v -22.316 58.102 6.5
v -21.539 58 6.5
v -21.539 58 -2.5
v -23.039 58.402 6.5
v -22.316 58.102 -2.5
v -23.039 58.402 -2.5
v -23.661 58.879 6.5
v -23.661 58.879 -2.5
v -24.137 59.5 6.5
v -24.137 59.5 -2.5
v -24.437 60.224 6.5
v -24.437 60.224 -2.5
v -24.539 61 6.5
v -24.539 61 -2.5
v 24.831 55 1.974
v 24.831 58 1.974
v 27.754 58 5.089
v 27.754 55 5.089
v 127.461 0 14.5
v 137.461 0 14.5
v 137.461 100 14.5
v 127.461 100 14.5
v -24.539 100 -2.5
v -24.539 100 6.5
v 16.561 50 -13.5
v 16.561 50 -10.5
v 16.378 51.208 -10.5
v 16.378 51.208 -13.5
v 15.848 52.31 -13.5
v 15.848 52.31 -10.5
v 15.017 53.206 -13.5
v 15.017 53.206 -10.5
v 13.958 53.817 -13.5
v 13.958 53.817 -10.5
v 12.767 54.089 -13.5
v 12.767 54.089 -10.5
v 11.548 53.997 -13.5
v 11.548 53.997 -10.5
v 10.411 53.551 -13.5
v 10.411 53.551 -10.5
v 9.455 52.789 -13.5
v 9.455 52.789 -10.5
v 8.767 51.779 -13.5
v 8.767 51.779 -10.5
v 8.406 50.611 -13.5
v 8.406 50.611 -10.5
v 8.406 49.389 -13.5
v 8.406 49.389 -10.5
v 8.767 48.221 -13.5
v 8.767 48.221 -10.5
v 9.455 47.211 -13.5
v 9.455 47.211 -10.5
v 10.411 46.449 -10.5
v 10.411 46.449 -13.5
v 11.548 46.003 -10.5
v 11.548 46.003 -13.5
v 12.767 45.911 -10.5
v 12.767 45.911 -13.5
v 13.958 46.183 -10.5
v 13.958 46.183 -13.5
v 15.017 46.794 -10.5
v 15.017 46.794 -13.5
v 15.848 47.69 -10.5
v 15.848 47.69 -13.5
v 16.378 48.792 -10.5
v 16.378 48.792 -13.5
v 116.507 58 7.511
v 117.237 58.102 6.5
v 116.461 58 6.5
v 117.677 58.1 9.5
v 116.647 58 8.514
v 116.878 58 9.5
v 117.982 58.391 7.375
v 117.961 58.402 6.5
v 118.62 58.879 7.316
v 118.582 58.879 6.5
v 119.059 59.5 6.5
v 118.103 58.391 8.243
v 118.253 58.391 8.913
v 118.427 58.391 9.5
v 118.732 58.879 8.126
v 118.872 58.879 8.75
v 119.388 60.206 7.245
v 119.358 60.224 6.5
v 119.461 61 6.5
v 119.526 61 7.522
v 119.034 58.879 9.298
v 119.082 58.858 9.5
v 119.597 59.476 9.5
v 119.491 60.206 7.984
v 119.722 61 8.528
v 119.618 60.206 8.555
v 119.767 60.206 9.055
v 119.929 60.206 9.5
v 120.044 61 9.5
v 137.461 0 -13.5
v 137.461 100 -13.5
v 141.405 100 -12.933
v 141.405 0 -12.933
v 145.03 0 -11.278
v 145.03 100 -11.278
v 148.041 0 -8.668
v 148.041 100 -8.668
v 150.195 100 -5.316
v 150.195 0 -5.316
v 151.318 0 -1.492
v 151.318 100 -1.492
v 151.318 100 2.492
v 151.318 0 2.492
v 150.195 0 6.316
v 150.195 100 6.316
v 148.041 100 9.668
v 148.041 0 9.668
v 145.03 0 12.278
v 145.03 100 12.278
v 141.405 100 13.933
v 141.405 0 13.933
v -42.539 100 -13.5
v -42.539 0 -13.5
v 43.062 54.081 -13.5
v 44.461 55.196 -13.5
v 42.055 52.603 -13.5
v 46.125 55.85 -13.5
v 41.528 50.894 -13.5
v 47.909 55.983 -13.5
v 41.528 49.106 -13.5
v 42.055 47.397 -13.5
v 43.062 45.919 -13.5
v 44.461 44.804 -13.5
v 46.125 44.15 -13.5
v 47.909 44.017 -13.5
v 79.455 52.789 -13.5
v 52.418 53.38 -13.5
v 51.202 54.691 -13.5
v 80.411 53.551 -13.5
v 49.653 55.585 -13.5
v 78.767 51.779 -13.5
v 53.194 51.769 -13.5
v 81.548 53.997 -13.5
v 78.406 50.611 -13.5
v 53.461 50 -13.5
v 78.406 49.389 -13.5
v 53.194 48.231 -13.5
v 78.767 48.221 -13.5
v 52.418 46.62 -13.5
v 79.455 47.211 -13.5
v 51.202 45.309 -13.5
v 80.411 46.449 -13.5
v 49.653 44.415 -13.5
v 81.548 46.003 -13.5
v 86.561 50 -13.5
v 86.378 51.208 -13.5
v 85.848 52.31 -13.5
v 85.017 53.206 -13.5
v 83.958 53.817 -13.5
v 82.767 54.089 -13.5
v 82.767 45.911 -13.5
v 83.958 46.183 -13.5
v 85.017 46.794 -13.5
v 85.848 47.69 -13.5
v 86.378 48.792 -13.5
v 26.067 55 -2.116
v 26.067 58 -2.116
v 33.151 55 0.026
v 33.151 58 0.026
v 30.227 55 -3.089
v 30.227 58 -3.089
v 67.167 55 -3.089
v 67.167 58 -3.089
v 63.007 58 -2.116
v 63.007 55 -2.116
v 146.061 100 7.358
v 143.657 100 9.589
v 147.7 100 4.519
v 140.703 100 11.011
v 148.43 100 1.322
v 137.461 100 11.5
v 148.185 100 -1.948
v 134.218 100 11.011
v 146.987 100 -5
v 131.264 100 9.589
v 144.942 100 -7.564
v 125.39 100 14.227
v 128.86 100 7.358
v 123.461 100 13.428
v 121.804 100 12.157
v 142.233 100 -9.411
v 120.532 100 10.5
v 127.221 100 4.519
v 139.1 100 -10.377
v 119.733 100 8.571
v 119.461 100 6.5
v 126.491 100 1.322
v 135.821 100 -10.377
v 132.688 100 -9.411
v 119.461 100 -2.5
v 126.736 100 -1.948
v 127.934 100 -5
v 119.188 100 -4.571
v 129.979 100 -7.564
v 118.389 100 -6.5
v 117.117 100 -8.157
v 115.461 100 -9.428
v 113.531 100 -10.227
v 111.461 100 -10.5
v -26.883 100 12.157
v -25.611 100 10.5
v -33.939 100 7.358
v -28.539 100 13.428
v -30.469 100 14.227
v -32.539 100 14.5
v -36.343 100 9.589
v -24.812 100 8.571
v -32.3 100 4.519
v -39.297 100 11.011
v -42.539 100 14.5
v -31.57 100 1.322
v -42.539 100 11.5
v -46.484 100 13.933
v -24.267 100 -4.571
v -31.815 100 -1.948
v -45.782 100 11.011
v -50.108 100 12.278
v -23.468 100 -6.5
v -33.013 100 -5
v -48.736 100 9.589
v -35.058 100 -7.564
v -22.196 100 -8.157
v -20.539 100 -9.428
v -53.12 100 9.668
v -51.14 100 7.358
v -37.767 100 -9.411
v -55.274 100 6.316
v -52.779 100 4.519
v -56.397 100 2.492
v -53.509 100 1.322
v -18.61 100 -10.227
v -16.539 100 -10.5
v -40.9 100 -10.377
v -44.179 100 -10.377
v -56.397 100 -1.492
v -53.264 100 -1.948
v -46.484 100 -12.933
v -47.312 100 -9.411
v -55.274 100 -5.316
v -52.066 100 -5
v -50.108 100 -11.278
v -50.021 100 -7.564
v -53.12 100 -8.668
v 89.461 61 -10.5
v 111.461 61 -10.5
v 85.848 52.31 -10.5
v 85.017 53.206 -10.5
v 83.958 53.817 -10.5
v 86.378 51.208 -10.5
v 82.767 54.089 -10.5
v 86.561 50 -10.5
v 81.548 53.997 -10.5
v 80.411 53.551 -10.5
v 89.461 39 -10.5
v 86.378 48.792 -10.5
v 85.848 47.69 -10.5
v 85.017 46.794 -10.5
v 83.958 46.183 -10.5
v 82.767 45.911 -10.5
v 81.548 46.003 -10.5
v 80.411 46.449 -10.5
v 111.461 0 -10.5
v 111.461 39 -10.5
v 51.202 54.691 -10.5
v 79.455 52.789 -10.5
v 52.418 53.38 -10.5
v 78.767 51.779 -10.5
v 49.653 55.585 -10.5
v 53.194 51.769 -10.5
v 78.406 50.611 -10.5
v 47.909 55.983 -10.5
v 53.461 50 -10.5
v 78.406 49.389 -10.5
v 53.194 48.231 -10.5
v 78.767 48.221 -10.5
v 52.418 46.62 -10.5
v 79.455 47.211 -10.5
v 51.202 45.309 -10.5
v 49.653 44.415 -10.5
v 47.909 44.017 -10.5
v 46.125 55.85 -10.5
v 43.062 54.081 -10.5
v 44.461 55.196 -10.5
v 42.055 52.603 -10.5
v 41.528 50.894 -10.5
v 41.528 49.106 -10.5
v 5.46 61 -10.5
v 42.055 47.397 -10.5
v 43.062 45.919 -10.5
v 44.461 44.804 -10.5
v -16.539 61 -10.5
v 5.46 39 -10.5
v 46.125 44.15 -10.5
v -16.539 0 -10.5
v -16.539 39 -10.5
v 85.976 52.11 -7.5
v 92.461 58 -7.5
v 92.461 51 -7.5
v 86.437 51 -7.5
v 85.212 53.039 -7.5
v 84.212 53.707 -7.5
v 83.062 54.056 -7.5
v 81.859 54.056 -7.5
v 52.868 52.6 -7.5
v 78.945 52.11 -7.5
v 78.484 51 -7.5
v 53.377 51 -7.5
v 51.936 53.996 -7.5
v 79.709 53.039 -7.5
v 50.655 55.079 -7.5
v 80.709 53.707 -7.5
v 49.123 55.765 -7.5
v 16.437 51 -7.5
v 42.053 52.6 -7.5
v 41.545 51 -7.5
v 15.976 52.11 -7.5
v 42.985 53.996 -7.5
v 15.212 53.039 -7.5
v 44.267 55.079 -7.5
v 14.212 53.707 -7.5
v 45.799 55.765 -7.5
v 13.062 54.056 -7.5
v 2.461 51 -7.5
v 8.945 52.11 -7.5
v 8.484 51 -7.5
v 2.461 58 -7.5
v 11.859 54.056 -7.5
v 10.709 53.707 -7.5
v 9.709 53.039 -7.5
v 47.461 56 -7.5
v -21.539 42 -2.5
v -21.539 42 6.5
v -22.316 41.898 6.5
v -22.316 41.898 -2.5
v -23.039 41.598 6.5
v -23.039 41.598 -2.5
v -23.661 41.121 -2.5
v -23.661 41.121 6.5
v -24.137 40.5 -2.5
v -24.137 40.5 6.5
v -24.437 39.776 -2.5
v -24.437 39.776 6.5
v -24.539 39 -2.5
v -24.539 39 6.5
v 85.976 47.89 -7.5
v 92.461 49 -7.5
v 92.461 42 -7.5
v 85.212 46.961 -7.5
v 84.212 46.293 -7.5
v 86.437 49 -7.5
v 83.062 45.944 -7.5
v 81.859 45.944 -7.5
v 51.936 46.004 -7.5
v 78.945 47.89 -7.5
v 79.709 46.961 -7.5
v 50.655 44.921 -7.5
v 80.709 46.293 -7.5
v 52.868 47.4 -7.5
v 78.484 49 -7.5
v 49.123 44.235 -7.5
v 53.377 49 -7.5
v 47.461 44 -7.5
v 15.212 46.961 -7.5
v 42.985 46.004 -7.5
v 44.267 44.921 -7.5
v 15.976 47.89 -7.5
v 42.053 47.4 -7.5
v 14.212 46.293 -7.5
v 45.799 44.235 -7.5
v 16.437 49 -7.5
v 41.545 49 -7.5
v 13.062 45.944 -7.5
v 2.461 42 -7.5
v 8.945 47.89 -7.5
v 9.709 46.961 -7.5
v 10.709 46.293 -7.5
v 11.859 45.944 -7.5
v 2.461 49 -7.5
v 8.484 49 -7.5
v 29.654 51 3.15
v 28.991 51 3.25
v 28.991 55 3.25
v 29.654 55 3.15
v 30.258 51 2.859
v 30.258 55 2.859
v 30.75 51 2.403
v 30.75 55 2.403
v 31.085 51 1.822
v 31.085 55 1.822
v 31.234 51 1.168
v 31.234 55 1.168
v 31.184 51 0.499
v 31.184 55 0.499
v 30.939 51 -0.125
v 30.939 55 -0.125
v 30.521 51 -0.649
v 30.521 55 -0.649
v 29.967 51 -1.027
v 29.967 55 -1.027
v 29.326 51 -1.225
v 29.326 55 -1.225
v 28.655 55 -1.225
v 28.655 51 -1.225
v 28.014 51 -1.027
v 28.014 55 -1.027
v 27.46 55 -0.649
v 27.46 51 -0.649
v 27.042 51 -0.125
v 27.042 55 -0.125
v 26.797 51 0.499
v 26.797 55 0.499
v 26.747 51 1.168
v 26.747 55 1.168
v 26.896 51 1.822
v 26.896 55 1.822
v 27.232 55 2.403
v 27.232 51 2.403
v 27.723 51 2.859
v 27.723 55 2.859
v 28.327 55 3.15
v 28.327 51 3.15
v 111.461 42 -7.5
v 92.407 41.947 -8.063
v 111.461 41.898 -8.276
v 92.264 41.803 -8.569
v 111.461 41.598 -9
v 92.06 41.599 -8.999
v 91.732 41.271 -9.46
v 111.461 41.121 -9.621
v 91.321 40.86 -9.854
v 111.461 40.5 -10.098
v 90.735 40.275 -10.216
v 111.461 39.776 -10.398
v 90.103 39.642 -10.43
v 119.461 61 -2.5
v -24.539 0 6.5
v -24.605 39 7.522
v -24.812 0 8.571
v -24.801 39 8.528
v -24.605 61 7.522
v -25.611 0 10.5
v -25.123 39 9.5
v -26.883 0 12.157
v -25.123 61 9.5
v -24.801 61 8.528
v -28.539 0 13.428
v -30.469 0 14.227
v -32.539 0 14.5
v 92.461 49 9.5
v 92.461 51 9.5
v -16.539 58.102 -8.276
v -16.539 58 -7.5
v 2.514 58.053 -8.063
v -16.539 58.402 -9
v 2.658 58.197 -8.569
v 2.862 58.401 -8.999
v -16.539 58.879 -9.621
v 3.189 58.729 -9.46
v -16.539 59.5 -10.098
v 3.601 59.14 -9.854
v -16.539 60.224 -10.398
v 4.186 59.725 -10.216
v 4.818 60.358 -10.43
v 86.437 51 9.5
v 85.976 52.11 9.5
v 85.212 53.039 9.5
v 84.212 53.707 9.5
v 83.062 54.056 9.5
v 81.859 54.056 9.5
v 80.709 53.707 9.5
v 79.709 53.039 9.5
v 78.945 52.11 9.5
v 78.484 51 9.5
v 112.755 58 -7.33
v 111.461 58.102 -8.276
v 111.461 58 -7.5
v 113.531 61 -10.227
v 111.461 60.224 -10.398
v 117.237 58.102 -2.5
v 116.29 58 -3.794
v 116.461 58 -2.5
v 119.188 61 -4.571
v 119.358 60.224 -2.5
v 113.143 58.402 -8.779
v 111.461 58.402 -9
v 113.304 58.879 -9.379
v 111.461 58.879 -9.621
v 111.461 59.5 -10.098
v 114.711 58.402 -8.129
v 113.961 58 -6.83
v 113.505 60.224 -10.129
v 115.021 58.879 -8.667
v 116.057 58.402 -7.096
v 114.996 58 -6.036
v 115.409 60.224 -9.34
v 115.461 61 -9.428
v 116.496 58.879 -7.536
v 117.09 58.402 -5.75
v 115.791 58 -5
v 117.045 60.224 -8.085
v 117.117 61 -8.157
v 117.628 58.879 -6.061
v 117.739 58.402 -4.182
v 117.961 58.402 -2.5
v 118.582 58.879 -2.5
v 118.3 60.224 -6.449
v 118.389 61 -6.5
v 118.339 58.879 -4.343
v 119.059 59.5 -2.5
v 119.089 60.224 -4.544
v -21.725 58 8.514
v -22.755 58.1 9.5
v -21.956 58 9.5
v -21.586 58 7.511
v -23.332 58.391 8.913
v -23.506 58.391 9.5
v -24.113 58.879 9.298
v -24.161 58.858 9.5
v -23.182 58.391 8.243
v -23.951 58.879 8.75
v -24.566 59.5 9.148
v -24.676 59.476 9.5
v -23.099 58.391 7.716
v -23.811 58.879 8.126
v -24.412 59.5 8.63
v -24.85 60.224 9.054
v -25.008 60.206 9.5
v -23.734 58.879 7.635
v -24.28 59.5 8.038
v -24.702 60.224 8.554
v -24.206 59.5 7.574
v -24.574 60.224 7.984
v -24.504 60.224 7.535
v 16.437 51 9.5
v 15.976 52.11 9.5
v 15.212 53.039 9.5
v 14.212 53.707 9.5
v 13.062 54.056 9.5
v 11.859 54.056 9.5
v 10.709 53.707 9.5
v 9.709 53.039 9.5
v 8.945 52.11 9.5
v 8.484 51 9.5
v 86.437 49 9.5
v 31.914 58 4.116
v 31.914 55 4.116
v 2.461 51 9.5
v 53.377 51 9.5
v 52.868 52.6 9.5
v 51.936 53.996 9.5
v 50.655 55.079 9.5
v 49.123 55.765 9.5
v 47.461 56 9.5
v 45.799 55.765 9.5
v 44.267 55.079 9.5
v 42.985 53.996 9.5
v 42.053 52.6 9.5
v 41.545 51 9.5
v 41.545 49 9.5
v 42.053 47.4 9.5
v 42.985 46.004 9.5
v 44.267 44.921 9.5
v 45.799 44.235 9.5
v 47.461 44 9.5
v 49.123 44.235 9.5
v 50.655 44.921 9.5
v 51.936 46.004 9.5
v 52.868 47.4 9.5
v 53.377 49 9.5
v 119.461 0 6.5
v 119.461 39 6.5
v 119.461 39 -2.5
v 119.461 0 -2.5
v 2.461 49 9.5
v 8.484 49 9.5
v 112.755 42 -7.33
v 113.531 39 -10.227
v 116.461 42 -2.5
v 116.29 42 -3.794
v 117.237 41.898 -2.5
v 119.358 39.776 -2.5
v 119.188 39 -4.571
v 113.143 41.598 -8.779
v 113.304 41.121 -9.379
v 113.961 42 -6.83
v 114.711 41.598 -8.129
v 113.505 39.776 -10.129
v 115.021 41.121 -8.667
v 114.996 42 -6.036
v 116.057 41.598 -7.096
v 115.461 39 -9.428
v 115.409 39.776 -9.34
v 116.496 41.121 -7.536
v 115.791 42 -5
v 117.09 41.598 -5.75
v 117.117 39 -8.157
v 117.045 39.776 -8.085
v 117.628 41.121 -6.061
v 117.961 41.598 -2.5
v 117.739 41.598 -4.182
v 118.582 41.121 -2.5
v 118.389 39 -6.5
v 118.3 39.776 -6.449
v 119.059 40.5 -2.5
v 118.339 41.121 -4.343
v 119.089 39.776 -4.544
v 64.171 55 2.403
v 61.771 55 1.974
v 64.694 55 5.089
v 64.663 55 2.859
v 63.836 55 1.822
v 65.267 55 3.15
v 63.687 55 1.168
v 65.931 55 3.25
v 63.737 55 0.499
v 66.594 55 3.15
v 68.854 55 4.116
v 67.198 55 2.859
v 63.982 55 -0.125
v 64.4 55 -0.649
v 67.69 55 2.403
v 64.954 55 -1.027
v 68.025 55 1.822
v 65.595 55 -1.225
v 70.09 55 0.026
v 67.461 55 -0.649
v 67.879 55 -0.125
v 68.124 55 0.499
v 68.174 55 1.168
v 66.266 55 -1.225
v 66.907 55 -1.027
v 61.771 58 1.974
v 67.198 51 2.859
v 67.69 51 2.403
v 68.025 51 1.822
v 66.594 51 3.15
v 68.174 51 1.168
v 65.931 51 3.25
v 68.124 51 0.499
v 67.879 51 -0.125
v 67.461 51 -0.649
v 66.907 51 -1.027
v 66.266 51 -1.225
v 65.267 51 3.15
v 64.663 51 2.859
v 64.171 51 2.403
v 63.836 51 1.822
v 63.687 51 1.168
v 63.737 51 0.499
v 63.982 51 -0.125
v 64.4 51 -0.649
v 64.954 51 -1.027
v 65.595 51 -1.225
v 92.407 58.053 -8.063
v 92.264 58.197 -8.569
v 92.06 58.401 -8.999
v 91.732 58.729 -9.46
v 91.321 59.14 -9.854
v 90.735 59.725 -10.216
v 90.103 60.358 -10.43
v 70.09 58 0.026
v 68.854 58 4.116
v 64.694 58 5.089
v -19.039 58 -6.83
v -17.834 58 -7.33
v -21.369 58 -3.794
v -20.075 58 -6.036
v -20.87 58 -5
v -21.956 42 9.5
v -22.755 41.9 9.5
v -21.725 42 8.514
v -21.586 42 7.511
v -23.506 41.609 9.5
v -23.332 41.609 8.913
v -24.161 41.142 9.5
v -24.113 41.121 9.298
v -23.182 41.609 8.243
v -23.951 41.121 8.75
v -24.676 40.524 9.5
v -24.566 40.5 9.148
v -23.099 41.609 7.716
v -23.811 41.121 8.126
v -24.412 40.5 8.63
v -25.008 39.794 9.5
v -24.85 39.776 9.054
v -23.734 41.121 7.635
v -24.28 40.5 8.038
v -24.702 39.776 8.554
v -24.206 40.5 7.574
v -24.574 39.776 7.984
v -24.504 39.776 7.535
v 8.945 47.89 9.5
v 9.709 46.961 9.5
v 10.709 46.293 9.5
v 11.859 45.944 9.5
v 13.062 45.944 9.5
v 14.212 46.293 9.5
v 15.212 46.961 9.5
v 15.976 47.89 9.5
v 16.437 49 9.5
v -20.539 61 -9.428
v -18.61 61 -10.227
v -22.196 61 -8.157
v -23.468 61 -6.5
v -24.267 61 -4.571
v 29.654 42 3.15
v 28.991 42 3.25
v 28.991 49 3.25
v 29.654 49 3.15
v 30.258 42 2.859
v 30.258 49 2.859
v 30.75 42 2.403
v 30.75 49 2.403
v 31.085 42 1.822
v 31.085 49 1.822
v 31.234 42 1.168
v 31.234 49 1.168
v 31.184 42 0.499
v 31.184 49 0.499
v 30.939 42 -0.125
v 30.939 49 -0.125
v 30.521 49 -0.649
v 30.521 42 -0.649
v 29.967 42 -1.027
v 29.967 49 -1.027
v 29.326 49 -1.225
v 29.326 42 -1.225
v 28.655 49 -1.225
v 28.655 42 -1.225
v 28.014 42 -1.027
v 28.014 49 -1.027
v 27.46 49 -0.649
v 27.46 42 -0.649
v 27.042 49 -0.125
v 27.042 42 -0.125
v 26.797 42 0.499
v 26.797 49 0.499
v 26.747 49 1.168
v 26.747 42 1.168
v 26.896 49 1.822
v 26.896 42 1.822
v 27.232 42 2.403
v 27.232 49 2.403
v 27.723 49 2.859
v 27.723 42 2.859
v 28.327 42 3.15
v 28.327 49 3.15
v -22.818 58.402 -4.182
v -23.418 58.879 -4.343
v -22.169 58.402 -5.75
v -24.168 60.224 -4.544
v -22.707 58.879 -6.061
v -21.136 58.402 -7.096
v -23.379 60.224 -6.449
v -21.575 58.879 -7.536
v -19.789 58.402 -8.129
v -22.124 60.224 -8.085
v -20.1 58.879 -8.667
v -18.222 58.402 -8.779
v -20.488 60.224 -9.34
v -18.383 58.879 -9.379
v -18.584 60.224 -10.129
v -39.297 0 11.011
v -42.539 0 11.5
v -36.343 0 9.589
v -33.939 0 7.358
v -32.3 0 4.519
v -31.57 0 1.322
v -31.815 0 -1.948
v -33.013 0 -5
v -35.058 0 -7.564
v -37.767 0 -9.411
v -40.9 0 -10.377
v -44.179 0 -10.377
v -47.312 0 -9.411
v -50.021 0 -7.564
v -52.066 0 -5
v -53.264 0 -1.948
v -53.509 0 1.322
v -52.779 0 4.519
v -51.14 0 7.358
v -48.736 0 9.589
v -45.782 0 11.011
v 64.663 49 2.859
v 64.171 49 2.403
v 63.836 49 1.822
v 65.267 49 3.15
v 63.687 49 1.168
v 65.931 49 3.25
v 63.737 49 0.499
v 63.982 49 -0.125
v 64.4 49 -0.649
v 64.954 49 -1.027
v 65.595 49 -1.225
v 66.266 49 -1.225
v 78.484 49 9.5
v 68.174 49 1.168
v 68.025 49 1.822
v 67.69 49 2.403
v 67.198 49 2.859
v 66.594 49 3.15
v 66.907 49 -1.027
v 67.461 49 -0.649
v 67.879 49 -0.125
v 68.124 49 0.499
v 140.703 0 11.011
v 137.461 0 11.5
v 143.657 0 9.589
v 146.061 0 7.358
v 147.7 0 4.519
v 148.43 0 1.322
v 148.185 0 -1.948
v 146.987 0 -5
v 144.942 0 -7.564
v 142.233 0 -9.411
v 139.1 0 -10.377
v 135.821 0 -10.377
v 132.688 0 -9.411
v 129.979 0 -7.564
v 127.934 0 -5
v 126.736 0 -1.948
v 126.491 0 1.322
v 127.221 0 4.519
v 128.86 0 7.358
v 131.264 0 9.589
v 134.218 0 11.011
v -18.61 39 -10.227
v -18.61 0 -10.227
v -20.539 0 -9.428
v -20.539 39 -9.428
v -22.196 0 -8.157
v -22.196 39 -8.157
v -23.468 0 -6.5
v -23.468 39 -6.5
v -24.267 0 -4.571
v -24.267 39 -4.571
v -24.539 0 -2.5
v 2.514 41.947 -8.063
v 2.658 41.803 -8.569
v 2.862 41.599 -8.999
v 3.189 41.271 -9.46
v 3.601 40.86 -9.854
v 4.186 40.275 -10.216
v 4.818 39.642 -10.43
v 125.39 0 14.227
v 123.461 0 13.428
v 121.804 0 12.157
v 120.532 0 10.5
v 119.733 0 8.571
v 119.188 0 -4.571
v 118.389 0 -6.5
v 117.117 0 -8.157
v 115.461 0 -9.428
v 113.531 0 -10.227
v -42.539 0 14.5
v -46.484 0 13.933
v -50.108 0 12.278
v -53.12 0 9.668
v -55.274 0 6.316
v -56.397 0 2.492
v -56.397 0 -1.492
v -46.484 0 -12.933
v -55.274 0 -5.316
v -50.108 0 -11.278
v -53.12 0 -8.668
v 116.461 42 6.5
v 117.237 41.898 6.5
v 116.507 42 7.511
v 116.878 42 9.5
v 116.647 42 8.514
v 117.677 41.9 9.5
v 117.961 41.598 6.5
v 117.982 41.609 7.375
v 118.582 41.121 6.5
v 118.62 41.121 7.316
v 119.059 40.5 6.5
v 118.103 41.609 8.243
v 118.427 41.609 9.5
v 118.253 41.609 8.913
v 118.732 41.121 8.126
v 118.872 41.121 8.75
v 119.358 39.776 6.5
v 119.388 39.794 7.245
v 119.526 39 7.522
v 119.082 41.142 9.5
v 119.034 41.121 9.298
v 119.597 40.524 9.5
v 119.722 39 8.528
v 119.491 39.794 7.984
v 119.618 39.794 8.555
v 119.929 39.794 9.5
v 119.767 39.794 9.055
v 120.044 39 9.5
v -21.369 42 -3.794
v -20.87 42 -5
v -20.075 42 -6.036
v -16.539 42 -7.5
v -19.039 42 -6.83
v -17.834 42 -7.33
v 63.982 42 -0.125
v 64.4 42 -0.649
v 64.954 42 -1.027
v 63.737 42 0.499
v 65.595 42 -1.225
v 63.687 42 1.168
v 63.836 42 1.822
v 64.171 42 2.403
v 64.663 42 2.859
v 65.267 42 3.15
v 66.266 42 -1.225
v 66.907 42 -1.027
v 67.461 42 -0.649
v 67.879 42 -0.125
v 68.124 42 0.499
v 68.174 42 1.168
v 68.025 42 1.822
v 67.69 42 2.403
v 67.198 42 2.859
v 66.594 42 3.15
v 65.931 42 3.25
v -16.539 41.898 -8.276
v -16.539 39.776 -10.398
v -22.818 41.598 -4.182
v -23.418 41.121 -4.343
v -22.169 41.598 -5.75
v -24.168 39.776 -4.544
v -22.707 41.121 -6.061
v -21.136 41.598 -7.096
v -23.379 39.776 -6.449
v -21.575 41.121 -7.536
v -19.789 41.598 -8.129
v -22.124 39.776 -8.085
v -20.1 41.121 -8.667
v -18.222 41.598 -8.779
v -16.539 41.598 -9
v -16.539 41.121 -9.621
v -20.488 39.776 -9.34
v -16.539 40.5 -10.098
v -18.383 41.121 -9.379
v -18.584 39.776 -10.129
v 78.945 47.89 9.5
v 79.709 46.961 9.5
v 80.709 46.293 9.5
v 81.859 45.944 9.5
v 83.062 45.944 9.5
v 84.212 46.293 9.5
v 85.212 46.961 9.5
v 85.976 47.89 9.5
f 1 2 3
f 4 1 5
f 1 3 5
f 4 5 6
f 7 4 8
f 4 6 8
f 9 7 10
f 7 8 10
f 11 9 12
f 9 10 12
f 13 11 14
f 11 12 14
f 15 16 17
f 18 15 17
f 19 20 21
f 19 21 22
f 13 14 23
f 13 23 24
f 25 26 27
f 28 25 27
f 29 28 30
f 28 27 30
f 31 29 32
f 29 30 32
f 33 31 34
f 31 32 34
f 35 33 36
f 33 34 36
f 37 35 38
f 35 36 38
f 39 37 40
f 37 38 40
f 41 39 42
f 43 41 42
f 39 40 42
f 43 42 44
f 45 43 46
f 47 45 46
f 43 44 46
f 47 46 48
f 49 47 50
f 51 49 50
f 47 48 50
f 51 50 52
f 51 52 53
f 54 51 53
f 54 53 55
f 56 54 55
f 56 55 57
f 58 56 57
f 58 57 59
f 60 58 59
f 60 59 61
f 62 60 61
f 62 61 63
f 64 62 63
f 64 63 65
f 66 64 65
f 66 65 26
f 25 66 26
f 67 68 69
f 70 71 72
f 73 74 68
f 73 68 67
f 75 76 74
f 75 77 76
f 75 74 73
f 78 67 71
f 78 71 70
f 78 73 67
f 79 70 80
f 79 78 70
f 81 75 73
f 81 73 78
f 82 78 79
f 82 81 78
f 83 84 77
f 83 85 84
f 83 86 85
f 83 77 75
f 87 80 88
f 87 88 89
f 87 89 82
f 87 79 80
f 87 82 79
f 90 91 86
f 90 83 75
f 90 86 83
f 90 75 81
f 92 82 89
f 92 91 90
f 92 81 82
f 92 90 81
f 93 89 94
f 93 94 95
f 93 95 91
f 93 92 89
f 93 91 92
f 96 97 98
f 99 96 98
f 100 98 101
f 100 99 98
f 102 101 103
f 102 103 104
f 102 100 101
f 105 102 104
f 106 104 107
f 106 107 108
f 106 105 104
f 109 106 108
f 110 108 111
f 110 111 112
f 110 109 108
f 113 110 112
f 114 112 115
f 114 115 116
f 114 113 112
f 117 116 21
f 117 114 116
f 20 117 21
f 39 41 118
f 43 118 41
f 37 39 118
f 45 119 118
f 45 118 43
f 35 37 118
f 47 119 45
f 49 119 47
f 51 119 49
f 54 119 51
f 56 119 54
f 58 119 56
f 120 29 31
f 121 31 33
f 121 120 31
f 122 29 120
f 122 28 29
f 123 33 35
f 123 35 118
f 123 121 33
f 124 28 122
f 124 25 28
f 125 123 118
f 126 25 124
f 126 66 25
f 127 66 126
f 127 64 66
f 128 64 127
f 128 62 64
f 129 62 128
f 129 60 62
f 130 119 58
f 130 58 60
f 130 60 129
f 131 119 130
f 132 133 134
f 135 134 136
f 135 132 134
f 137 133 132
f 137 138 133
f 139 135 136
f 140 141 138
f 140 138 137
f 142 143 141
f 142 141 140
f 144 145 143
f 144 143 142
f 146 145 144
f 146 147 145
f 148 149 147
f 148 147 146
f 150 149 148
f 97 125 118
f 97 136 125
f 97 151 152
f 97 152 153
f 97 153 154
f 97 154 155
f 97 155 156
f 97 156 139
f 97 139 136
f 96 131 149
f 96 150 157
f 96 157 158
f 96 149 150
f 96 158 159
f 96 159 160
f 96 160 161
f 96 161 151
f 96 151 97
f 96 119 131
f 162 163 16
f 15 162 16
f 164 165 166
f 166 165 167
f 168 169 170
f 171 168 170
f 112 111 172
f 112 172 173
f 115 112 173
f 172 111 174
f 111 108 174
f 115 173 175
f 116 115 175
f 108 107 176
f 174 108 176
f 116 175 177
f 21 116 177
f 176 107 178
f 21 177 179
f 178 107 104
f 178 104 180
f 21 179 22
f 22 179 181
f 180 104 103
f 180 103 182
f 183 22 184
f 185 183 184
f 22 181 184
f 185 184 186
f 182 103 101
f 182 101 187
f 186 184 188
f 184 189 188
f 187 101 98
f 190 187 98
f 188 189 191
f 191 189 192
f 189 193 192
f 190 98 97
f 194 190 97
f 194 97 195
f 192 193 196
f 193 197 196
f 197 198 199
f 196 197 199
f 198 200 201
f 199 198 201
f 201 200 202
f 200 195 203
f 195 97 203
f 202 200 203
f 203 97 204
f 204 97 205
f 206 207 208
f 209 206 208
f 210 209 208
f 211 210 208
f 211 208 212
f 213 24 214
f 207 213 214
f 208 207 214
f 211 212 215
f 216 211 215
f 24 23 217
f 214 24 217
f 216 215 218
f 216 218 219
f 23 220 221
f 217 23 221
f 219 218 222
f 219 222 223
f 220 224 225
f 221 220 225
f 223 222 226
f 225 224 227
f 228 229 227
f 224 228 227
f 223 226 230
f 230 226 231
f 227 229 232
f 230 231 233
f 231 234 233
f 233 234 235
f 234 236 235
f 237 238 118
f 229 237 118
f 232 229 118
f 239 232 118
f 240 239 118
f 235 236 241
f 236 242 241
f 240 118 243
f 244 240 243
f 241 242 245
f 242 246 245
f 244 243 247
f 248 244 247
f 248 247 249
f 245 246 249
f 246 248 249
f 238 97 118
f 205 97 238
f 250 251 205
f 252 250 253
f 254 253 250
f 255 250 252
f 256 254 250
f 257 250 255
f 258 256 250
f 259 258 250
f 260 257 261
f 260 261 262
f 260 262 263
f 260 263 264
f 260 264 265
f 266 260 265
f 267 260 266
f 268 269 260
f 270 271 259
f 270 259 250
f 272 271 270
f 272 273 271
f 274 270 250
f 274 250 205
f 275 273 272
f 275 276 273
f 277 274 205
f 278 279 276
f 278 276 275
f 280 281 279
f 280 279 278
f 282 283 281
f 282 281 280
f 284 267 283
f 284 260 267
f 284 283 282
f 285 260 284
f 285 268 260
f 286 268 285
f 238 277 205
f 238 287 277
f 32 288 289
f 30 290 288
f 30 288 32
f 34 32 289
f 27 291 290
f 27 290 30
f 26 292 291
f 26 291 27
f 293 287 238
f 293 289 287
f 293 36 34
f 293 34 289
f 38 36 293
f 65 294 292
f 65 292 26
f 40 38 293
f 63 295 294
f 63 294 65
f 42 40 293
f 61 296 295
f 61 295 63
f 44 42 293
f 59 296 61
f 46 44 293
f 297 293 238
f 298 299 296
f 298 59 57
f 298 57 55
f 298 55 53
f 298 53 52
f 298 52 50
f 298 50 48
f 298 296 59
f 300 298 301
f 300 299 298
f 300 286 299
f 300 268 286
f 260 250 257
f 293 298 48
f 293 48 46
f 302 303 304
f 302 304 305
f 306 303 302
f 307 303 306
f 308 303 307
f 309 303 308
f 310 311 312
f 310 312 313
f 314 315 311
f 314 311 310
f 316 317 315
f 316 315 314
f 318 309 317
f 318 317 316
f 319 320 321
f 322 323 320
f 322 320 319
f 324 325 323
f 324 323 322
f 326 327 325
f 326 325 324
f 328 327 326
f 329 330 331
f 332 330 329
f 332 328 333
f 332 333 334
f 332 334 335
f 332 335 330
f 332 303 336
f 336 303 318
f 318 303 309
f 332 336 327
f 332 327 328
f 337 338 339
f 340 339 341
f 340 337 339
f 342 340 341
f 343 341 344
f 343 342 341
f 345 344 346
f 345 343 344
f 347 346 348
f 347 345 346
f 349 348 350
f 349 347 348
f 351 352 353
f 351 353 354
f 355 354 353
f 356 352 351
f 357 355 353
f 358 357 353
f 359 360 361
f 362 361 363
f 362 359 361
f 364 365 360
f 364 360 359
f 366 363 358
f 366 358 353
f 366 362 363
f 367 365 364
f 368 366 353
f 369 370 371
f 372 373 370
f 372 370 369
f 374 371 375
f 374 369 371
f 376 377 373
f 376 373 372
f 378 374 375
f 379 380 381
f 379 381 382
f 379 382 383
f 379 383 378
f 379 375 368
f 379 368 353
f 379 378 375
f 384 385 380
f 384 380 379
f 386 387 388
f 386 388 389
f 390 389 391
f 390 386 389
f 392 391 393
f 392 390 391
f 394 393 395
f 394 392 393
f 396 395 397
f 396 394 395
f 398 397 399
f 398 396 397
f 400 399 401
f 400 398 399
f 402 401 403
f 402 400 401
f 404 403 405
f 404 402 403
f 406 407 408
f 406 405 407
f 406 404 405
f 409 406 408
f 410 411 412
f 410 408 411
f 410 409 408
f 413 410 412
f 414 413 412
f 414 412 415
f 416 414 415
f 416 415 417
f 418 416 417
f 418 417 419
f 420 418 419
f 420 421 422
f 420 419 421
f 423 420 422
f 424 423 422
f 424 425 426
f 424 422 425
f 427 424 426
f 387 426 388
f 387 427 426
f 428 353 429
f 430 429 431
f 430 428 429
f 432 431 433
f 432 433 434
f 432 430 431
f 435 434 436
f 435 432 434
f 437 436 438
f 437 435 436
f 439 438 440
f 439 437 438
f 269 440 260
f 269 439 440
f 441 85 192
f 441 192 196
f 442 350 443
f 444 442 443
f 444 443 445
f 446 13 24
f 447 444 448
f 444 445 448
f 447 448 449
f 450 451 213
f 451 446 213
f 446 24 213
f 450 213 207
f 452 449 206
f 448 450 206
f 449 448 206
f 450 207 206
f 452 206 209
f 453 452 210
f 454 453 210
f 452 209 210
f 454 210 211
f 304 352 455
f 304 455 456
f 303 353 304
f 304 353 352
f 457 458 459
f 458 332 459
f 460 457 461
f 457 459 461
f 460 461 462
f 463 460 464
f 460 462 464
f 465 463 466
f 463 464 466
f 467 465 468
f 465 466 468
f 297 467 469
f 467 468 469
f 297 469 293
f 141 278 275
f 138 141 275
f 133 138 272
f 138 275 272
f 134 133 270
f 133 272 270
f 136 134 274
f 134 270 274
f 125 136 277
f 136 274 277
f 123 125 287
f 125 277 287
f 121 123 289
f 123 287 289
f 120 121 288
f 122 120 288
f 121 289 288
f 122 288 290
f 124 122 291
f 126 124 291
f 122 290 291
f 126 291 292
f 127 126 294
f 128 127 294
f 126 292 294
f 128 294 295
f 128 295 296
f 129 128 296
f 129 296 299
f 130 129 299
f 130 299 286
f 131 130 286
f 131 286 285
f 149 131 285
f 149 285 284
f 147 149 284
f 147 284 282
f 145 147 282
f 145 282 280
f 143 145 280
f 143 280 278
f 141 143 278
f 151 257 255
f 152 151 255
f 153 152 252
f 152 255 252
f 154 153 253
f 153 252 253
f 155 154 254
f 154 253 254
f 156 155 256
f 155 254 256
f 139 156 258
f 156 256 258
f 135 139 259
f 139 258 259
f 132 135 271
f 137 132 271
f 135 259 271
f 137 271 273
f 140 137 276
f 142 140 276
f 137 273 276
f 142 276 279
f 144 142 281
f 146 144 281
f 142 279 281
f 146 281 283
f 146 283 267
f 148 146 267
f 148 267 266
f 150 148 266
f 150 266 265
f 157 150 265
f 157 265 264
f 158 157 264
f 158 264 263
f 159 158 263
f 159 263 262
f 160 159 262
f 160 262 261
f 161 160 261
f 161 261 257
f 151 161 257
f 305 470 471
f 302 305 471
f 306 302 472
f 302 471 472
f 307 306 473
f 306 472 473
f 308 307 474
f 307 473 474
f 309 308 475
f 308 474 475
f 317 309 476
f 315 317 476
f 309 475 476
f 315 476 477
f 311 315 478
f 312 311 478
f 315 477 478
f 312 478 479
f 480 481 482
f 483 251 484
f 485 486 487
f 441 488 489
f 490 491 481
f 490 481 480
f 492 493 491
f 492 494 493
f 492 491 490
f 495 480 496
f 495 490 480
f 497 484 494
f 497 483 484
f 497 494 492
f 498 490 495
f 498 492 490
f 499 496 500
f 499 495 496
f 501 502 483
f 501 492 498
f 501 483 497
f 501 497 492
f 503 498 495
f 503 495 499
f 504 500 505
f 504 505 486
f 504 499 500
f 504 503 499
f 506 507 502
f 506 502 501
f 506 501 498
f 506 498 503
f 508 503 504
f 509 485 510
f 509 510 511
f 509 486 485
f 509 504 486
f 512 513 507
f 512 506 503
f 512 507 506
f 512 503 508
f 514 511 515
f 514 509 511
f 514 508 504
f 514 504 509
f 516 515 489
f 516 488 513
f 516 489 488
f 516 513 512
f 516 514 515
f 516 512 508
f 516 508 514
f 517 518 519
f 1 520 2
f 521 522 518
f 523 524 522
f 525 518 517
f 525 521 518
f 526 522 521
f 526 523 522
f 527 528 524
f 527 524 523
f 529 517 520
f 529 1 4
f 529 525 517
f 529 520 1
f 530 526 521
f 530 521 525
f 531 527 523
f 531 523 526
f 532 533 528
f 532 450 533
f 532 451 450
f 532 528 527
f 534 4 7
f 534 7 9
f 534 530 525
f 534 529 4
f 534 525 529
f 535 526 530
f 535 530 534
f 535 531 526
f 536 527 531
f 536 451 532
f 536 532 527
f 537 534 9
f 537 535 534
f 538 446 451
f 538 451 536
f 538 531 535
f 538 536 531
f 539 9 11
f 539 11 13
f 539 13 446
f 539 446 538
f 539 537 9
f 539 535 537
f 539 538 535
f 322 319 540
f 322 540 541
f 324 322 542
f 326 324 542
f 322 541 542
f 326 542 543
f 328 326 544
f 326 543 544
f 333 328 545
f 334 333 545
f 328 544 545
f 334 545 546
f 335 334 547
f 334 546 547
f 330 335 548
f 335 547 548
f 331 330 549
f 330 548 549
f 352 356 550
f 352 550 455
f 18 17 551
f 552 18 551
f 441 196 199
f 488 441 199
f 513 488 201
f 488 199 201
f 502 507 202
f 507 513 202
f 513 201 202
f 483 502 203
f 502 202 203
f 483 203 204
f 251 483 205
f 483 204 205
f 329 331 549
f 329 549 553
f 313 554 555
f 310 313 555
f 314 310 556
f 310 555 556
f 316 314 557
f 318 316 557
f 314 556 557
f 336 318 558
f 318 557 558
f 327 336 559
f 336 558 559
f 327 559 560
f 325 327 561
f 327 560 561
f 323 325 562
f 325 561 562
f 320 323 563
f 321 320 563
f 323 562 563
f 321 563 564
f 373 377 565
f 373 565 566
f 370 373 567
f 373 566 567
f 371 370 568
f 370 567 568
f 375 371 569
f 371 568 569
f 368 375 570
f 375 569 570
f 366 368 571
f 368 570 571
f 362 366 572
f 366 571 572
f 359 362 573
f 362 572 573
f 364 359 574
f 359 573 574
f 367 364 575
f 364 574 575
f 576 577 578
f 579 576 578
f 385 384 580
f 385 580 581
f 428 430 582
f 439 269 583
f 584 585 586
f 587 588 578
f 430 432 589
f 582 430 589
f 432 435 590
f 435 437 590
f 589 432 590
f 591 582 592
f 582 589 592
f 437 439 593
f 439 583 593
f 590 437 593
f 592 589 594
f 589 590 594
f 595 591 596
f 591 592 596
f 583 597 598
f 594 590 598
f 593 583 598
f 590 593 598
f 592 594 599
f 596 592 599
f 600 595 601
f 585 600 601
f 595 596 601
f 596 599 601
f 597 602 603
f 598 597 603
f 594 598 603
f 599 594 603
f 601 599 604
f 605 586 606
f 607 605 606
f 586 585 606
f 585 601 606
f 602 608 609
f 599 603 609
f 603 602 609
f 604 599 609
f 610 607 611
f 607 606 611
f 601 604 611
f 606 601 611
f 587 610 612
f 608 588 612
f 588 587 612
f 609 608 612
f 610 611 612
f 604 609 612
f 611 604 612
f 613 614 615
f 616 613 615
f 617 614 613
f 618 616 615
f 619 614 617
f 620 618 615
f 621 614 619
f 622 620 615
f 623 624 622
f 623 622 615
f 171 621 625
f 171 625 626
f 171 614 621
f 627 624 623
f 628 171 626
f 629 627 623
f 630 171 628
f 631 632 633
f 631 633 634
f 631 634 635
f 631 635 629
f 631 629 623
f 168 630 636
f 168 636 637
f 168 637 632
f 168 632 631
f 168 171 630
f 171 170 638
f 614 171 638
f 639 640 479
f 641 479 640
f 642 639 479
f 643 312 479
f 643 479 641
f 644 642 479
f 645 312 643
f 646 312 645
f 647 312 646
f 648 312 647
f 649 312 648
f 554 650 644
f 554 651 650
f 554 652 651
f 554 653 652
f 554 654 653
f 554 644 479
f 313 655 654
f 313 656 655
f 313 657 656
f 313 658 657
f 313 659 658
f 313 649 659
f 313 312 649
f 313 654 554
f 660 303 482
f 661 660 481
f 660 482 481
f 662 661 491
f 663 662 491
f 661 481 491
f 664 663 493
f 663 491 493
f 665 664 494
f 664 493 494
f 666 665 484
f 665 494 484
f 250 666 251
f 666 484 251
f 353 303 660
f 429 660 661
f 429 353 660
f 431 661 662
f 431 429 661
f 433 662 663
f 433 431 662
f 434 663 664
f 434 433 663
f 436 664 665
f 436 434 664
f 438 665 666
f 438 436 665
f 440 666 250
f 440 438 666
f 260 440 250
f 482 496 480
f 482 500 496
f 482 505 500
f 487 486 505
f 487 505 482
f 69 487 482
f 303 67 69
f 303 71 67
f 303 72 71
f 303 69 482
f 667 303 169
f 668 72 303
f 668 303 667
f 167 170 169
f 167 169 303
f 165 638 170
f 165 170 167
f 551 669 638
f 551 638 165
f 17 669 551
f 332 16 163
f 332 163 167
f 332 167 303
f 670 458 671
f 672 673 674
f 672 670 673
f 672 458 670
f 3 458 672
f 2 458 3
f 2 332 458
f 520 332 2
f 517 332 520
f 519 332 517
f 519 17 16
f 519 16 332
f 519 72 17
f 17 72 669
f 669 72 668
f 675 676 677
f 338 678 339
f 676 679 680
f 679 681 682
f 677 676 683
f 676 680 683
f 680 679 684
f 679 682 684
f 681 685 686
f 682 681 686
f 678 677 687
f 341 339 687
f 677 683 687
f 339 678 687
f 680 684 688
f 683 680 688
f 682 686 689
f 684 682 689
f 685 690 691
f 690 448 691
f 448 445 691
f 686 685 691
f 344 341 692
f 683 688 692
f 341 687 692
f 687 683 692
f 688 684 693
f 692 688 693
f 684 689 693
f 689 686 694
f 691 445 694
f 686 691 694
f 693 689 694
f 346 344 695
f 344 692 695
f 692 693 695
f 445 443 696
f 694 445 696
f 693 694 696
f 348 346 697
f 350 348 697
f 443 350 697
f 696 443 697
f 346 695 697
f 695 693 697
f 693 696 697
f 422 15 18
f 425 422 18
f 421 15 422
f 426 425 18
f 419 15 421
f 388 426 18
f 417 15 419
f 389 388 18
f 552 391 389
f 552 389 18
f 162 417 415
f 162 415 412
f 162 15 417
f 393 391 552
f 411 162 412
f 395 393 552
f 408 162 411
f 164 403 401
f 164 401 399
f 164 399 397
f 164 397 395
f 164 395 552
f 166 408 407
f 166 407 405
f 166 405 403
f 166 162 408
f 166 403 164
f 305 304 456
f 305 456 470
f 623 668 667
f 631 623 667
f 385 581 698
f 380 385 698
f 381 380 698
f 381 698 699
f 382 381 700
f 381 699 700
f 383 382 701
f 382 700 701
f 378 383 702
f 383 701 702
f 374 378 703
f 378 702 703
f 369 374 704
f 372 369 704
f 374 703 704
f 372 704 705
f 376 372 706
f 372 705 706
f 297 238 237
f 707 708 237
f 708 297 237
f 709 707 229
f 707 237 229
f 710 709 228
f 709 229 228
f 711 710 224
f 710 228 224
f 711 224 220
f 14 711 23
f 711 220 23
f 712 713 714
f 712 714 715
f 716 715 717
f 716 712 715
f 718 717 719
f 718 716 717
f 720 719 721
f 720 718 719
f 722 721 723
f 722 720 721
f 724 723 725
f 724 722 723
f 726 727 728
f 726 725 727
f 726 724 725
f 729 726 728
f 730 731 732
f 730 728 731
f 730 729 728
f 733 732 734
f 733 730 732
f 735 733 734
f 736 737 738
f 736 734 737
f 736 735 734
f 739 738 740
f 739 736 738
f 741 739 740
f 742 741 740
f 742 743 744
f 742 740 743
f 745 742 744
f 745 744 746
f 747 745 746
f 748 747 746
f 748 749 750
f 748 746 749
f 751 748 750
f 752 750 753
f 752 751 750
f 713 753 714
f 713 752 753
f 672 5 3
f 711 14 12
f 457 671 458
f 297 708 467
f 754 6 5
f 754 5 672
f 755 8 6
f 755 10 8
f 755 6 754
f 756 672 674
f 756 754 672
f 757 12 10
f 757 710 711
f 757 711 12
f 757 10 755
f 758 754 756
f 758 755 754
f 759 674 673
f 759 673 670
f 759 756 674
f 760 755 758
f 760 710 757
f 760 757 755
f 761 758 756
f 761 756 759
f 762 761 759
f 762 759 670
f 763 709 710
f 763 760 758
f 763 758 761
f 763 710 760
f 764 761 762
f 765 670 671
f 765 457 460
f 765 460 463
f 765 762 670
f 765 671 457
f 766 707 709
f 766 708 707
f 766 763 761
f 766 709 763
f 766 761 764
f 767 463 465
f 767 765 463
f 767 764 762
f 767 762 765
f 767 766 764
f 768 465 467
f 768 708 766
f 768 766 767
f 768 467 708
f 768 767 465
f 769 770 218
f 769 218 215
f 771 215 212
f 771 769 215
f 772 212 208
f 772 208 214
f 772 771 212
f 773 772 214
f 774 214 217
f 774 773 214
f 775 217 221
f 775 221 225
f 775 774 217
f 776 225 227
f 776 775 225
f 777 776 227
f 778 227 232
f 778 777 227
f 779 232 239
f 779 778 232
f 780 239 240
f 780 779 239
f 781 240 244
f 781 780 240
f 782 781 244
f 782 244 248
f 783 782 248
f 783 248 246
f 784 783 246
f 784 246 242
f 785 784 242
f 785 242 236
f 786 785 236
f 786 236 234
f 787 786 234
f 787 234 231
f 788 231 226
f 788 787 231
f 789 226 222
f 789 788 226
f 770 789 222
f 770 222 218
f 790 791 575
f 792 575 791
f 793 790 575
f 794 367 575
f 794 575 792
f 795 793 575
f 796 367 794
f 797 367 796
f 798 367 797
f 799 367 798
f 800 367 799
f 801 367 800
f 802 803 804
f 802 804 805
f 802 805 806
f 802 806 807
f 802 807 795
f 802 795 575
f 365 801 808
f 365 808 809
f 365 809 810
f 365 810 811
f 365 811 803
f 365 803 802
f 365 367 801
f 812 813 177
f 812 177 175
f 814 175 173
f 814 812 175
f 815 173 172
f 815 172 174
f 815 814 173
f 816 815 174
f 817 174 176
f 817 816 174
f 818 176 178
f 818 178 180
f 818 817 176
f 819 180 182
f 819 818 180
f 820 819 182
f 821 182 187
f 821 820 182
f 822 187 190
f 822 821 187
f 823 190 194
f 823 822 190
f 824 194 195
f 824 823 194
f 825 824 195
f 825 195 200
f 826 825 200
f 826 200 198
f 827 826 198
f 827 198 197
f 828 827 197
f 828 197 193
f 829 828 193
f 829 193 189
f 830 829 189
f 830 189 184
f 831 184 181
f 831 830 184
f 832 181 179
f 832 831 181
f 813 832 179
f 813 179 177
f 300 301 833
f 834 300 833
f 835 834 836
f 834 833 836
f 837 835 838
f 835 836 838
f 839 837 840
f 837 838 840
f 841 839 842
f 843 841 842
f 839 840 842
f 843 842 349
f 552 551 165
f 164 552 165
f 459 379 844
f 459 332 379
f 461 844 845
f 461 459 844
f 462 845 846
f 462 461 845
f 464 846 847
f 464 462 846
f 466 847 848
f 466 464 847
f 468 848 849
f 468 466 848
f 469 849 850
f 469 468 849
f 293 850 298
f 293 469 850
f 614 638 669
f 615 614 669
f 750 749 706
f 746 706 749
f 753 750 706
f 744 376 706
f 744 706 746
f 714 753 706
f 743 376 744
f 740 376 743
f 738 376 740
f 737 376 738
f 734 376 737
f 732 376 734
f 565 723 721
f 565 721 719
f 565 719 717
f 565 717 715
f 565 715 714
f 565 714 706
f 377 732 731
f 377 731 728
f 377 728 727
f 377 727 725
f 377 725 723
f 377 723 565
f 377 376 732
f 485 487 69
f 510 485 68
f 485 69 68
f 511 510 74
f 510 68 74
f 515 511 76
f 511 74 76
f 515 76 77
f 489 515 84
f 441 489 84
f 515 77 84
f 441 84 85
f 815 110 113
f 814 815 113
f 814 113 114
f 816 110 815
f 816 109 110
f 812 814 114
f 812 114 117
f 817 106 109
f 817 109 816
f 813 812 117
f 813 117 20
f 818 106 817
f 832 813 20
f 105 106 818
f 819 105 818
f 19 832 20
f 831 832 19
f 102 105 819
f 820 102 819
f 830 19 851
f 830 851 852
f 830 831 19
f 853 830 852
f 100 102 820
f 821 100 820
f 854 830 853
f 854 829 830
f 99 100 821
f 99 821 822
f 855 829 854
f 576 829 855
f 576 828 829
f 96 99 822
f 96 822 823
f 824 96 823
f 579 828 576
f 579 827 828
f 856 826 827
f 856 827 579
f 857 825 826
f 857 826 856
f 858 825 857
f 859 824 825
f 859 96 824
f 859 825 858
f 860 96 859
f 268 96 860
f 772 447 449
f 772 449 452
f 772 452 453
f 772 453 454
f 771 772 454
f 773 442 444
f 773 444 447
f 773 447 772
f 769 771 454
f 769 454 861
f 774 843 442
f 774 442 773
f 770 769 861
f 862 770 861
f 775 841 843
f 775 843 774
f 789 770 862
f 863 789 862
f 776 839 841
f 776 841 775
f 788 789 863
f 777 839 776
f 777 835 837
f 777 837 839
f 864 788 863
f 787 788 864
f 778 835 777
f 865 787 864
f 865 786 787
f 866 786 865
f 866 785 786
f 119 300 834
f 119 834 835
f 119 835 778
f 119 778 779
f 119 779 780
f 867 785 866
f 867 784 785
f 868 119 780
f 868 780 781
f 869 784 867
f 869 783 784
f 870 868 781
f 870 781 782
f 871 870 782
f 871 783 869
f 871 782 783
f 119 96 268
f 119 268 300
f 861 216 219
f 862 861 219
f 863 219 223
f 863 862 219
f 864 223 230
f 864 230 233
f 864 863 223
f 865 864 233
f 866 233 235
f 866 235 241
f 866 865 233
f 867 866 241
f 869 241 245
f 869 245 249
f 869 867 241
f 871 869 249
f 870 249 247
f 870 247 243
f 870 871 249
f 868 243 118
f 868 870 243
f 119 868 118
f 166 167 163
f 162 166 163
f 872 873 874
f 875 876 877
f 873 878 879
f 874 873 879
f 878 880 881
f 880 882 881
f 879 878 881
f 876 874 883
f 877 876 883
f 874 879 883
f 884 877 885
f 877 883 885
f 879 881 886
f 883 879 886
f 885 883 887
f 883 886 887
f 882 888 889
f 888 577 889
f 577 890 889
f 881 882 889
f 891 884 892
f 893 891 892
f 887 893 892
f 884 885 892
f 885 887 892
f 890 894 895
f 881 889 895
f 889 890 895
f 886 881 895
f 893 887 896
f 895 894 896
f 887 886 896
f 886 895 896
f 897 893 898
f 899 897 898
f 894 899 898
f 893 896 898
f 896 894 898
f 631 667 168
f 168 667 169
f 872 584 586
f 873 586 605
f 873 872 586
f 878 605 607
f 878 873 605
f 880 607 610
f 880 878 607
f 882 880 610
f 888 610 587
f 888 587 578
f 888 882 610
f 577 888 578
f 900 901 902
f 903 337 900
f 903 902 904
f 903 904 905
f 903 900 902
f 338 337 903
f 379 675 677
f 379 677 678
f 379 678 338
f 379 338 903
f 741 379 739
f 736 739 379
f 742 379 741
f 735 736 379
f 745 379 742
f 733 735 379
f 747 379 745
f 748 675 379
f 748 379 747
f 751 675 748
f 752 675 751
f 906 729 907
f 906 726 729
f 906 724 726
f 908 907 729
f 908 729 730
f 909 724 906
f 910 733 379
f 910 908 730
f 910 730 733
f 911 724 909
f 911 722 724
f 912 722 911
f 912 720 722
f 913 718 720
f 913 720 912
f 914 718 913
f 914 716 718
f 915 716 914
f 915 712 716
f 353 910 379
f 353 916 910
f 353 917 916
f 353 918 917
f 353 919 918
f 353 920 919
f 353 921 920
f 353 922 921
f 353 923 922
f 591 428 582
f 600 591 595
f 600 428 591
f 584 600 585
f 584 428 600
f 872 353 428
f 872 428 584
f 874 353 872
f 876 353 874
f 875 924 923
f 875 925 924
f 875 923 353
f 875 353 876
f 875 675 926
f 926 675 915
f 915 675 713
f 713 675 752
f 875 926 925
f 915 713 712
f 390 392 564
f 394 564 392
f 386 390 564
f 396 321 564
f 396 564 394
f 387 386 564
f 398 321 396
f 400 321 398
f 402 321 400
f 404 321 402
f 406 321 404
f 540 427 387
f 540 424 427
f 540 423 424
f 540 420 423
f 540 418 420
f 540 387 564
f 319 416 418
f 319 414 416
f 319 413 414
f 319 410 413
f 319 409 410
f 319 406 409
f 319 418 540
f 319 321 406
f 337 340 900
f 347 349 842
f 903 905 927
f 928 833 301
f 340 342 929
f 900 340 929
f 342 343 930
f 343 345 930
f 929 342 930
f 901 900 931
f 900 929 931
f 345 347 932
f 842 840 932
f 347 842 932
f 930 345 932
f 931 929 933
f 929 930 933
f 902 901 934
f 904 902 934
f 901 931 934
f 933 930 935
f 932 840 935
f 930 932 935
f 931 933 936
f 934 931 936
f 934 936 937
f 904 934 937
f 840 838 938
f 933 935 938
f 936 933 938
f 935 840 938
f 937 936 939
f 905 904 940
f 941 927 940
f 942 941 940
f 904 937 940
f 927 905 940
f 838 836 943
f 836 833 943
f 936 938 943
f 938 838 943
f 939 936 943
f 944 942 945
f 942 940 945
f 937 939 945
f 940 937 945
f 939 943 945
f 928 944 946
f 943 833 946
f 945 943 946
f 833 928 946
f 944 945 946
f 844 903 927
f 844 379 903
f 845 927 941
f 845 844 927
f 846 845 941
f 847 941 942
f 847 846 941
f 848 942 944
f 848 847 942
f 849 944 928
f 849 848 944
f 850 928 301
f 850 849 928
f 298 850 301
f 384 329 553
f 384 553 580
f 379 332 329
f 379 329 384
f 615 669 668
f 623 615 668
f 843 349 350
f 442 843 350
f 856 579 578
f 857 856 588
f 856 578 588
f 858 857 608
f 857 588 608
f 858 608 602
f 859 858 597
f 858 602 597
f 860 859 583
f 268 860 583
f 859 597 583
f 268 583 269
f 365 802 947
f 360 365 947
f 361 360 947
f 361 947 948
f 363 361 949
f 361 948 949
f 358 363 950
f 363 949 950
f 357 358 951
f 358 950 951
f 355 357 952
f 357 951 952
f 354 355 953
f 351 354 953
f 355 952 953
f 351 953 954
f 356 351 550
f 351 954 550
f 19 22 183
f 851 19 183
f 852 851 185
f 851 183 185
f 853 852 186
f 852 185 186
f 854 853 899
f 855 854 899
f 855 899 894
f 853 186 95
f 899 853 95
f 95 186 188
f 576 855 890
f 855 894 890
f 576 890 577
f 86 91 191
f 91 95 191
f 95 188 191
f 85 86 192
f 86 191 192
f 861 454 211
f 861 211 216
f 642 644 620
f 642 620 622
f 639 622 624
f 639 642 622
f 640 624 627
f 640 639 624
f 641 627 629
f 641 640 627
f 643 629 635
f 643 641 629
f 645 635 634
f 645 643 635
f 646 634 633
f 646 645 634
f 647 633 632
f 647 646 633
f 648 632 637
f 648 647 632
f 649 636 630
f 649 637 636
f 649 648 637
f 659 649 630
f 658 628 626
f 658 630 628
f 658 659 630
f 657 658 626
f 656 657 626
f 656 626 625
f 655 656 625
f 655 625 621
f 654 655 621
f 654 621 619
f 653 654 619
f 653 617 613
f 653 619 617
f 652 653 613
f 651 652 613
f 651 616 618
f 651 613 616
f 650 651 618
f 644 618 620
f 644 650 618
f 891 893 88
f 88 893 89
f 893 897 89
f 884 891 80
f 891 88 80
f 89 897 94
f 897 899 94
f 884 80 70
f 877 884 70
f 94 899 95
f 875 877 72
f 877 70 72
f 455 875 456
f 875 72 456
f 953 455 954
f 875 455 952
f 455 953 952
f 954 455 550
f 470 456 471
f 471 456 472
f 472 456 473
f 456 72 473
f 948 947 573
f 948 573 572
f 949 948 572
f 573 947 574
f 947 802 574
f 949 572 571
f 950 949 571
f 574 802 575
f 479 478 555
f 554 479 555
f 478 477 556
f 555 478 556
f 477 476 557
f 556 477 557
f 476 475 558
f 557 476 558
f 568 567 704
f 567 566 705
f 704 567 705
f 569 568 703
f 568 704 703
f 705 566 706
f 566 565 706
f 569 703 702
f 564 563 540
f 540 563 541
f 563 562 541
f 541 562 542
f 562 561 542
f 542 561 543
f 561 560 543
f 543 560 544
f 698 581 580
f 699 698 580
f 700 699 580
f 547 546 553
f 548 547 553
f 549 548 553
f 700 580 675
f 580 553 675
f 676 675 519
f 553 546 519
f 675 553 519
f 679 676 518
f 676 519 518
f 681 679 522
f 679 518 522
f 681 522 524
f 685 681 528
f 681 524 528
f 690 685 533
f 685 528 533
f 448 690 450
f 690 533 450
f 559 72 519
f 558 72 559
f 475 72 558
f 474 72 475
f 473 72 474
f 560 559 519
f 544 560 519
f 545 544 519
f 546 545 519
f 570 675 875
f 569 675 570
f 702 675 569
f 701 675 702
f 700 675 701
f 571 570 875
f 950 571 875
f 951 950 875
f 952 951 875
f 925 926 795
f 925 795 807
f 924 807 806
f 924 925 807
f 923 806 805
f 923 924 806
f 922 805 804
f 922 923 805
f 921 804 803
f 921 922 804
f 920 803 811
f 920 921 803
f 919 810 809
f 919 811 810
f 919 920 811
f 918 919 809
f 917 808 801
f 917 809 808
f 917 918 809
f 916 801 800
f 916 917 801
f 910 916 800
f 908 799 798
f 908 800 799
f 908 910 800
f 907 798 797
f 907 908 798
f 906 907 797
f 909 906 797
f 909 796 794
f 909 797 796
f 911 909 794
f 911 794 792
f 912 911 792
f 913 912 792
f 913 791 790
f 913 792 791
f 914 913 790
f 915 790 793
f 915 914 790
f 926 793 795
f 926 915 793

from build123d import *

# Parameters (mm, degrees)
SKETCH1_R                    = 11
BOSS_EXTRUDE1_DEPTH          = 100
FILLET1_R                    = 8
SKETCH2_R                    = 4.1
SKETCH2_R_2                  = 6
CUT_EXTRUDE1_DEPTH           = 10
BOSS_EXTRUDE2_START          = 20
SKETCH3_R                    = 4.1
SKETCH3_R_2                  = 6
BOSS_EXTRUDE2_DEPTH          = 20
FILLET2_R                    = 3
CUT_EXTRUDE_THIN1_DEPTH      = 183.94618817
CUT_EXTRUDE_THIN1_DEPTH_BACK = 20
CUT_EXTRUDE_THIN2_DEPTH      = 163.832913644
CUT_EXTRUDE_THIN2_DEPTH_BACK = 20
FILLET3_R                    = 3
CUT_EXTRUDE2_DEPTH           = 161.472919104
CUT_EXTRUDE2_DEPTH_BACK      = 161.472919104
SKETCH6_R                    = 2.25
CUT_EXTRUDE3_DEPTH           = 3


with BuildPart() as part:
    # Sketch1 → Boss-Extrude1 (new body)
    with BuildSketch(Plane(origin=(0, 0, 0), x_dir=(1, 0, 0), z_dir=(0, 1, 0))):
        with BuildLine():
            Line((137.460581558, -14.5), (119.460581558, -14.5))
            Line((119.460581558, -14.5), (119.460581558, 10.5))
            Line((119.460581558, 10.5), (-24.539418442, 10.5))
            Line((-24.539418442, 10.5), (-24.539418442, -14.5))
            Line((-24.539418442, -14.5), (-42.539418442, -14.5))
            ThreePointArc((-42.539418442, -14.5), (-56.539418442, -0.5), (-42.539418442, 13.5))
            Line((-42.539418442, 13.5), (137.460581558, 13.5))
            ThreePointArc((137.460581558, 13.5), (151.460581558, -0.5), (137.460581558, -14.5))
        make_face()
        with Locations(Location((-42.539418442, -0.5, 0), (0, 0, 270))):
            Circle(SKETCH1_R, mode=Mode.SUBTRACT)
        with Locations(Location((137.460581558, -0.5, 0), (0, 0, 270))):
            Circle(SKETCH1_R, mode=Mode.SUBTRACT)
    extrude(amount=BOSS_EXTRUDE1_DEPTH)

    # Fillet1
    fillet1_edges = [part.edges().sort_by_distance(p)[0] for p in [
        (119.460581558, 50, 14.5),
        (119.460581558, 50, -10.5),
        (-24.539418442, 50, -10.5),
        (-24.539418442, 50, 14.5),
    ]]
    fillet(fillet1_edges, radius=FILLET1_R)

    # Sketch2 → Cut-Extrude1 (cut)
    with BuildSketch(Plane.XY.offset(-10.5)):
        with Locations((12.460581558, 50)):
            Circle(SKETCH2_R)
        with Locations((82.460581558, 50)):
            Circle(SKETCH2_R)
        with Locations((47.460581558, 50)):
            Circle(SKETCH2_R_2)
    extrude(amount=-CUT_EXTRUDE1_DEPTH, mode=Mode.SUBTRACT)

    # Sketch3 → Boss-Extrude2 (add)
    with BuildSketch(Plane.XY.offset(-10.5).offset(BOSS_EXTRUDE2_START)):
        Polygon((12.460581558, 58), (82.460581558, 58), (124.149440998, 58), (124.149440998, 42), (82.460581558, 42), (12.460581558, 42), (-28.8662965, 42), (-28.8662965, 58), (-16.539418442, 58), align=None)
        with Locations((12.460581558, 50)):
            Circle(SKETCH3_R, mode=Mode.SUBTRACT)
        with Locations((82.460581558, 50)):
            Circle(SKETCH3_R, mode=Mode.SUBTRACT)
        with Locations((47.460581558, 50)):
            Circle(SKETCH3_R_2, mode=Mode.SUBTRACT)
    extrude(amount=-BOSS_EXTRUDE2_DEPTH)

    # Fillet2
    fillet2_edges = [part.edges().sort_by_distance(p)[0] for p in [
        (-24.686725022, 58, 8.0281381),
        (-24.686725022, 42, 8.0281381),
        (47.460581558, 42, -10.5),
        (117.117435807, 42, -8.156854249),
        (119.460581558, 42, 2),
        (-24.539418442, 42, 2),
        (-22.196272692, 42, -8.156854249),
        (119.607888138, 42, 8.0281381),
        (119.460581558, 58, 2),
        (117.117435807, 58, -8.156854249),
        (47.460581558, 58, -10.5),
        (-22.196272692, 58, -8.156854249),
        (-24.539418442, 58, 2),
        (119.607888138, 58, 8.0281381),
    ]]
    fillet(fillet2_edges, radius=FILLET2_R)

    # Sketch4 → Cut-Extrude-Thin1 (cut, two sides: drawn at the far end of the back side and taken through both)
    with BuildSketch(Plane.XY.offset(9.5).offset(-CUT_EXTRUDE_THIN1_DEPTH_BACK)):
        Polygon((92.460581558, 51), (47.460581558, 51), (2.460581558, 51), (2.460581558, 49), (47.460581558, 49), (92.460581558, 49), align=None)
    extrude(amount=CUT_EXTRUDE_THIN1_DEPTH + CUT_EXTRUDE_THIN1_DEPTH_BACK, mode=Mode.SUBTRACT)

    # Sketch5 → Cut-Extrude-Thin2 (cut, two sides: drawn at the far end of the back side and taken through both)
    with BuildSketch(Plane(origin=(0, 42, 0), x_dir=(-1, 0, 0), z_dir=(0, -1, 0)).offset(-CUT_EXTRUDE_THIN2_DEPTH_BACK)):
        Polygon((-2.460581558, 7.5), (-47.460581558, 7.5), (-92.460581558, 7.5), (-92.460581558, 10.5), (-47.460581558, 10.5), (-2.460581558, 10.5), align=None)
    extrude(amount=CUT_EXTRUDE_THIN2_DEPTH + CUT_EXTRUDE_THIN2_DEPTH_BACK, mode=Mode.SUBTRACT)

    # Fillet3
    fillet3_edges = [part.edges().sort_by_distance(p)[0] for p in [
        (2.460581558, 50, -10.5),
        (92.460581558, 50, -10.5),
    ]]
    fillet(fillet3_edges, radius=FILLET3_R - 0.0001)  # a hair under: the kernel refuses the full size

    # Sketch6 → Cut-Extrude2 (cut, two sides: drawn at the far end of the back side and taken through both)
    with BuildSketch(Plane(origin=(0, 49, 0), x_dir=(1, 0, 0), z_dir=(0, 1, 0)).offset(-CUT_EXTRUDE2_DEPTH_BACK)):
        with Locations(Location((28.990631201, -1, 0), (0, 0, 270))):
            Circle(SKETCH6_R)
        with Locations(Location((65.930531914, -1, 0), (0, 0, 270))):
            Circle(SKETCH6_R)
    extrude(amount=CUT_EXTRUDE2_DEPTH + CUT_EXTRUDE2_DEPTH_BACK, mode=Mode.SUBTRACT)

    # Sketch7 → Cut-Extrude3 (cut)
    with BuildSketch(Plane(origin=(0, 58, 0), x_dir=(1, 0, 0), z_dir=(0, 1, 0))):
        Polygon((33.150591825, -0.026315789), (30.227376252, 3.089473684), (26.067415628, 2.115789474), (24.830670578, -1.973684211), (27.753886151, -5.089473684), (31.913846775, -4.115789474), align=None)
        Polygon((70.090492538, -0.026315789), (67.167276964, 3.089473684), (63.007316341, 2.115789474), (61.77057129, -1.973684211), (64.693786864, -5.089473684), (68.853747488, -4.115789474), align=None)
    extrude(amount=-CUT_EXTRUDE3_DEPTH, mode=Mode.SUBTRACT)


solid = part.part
